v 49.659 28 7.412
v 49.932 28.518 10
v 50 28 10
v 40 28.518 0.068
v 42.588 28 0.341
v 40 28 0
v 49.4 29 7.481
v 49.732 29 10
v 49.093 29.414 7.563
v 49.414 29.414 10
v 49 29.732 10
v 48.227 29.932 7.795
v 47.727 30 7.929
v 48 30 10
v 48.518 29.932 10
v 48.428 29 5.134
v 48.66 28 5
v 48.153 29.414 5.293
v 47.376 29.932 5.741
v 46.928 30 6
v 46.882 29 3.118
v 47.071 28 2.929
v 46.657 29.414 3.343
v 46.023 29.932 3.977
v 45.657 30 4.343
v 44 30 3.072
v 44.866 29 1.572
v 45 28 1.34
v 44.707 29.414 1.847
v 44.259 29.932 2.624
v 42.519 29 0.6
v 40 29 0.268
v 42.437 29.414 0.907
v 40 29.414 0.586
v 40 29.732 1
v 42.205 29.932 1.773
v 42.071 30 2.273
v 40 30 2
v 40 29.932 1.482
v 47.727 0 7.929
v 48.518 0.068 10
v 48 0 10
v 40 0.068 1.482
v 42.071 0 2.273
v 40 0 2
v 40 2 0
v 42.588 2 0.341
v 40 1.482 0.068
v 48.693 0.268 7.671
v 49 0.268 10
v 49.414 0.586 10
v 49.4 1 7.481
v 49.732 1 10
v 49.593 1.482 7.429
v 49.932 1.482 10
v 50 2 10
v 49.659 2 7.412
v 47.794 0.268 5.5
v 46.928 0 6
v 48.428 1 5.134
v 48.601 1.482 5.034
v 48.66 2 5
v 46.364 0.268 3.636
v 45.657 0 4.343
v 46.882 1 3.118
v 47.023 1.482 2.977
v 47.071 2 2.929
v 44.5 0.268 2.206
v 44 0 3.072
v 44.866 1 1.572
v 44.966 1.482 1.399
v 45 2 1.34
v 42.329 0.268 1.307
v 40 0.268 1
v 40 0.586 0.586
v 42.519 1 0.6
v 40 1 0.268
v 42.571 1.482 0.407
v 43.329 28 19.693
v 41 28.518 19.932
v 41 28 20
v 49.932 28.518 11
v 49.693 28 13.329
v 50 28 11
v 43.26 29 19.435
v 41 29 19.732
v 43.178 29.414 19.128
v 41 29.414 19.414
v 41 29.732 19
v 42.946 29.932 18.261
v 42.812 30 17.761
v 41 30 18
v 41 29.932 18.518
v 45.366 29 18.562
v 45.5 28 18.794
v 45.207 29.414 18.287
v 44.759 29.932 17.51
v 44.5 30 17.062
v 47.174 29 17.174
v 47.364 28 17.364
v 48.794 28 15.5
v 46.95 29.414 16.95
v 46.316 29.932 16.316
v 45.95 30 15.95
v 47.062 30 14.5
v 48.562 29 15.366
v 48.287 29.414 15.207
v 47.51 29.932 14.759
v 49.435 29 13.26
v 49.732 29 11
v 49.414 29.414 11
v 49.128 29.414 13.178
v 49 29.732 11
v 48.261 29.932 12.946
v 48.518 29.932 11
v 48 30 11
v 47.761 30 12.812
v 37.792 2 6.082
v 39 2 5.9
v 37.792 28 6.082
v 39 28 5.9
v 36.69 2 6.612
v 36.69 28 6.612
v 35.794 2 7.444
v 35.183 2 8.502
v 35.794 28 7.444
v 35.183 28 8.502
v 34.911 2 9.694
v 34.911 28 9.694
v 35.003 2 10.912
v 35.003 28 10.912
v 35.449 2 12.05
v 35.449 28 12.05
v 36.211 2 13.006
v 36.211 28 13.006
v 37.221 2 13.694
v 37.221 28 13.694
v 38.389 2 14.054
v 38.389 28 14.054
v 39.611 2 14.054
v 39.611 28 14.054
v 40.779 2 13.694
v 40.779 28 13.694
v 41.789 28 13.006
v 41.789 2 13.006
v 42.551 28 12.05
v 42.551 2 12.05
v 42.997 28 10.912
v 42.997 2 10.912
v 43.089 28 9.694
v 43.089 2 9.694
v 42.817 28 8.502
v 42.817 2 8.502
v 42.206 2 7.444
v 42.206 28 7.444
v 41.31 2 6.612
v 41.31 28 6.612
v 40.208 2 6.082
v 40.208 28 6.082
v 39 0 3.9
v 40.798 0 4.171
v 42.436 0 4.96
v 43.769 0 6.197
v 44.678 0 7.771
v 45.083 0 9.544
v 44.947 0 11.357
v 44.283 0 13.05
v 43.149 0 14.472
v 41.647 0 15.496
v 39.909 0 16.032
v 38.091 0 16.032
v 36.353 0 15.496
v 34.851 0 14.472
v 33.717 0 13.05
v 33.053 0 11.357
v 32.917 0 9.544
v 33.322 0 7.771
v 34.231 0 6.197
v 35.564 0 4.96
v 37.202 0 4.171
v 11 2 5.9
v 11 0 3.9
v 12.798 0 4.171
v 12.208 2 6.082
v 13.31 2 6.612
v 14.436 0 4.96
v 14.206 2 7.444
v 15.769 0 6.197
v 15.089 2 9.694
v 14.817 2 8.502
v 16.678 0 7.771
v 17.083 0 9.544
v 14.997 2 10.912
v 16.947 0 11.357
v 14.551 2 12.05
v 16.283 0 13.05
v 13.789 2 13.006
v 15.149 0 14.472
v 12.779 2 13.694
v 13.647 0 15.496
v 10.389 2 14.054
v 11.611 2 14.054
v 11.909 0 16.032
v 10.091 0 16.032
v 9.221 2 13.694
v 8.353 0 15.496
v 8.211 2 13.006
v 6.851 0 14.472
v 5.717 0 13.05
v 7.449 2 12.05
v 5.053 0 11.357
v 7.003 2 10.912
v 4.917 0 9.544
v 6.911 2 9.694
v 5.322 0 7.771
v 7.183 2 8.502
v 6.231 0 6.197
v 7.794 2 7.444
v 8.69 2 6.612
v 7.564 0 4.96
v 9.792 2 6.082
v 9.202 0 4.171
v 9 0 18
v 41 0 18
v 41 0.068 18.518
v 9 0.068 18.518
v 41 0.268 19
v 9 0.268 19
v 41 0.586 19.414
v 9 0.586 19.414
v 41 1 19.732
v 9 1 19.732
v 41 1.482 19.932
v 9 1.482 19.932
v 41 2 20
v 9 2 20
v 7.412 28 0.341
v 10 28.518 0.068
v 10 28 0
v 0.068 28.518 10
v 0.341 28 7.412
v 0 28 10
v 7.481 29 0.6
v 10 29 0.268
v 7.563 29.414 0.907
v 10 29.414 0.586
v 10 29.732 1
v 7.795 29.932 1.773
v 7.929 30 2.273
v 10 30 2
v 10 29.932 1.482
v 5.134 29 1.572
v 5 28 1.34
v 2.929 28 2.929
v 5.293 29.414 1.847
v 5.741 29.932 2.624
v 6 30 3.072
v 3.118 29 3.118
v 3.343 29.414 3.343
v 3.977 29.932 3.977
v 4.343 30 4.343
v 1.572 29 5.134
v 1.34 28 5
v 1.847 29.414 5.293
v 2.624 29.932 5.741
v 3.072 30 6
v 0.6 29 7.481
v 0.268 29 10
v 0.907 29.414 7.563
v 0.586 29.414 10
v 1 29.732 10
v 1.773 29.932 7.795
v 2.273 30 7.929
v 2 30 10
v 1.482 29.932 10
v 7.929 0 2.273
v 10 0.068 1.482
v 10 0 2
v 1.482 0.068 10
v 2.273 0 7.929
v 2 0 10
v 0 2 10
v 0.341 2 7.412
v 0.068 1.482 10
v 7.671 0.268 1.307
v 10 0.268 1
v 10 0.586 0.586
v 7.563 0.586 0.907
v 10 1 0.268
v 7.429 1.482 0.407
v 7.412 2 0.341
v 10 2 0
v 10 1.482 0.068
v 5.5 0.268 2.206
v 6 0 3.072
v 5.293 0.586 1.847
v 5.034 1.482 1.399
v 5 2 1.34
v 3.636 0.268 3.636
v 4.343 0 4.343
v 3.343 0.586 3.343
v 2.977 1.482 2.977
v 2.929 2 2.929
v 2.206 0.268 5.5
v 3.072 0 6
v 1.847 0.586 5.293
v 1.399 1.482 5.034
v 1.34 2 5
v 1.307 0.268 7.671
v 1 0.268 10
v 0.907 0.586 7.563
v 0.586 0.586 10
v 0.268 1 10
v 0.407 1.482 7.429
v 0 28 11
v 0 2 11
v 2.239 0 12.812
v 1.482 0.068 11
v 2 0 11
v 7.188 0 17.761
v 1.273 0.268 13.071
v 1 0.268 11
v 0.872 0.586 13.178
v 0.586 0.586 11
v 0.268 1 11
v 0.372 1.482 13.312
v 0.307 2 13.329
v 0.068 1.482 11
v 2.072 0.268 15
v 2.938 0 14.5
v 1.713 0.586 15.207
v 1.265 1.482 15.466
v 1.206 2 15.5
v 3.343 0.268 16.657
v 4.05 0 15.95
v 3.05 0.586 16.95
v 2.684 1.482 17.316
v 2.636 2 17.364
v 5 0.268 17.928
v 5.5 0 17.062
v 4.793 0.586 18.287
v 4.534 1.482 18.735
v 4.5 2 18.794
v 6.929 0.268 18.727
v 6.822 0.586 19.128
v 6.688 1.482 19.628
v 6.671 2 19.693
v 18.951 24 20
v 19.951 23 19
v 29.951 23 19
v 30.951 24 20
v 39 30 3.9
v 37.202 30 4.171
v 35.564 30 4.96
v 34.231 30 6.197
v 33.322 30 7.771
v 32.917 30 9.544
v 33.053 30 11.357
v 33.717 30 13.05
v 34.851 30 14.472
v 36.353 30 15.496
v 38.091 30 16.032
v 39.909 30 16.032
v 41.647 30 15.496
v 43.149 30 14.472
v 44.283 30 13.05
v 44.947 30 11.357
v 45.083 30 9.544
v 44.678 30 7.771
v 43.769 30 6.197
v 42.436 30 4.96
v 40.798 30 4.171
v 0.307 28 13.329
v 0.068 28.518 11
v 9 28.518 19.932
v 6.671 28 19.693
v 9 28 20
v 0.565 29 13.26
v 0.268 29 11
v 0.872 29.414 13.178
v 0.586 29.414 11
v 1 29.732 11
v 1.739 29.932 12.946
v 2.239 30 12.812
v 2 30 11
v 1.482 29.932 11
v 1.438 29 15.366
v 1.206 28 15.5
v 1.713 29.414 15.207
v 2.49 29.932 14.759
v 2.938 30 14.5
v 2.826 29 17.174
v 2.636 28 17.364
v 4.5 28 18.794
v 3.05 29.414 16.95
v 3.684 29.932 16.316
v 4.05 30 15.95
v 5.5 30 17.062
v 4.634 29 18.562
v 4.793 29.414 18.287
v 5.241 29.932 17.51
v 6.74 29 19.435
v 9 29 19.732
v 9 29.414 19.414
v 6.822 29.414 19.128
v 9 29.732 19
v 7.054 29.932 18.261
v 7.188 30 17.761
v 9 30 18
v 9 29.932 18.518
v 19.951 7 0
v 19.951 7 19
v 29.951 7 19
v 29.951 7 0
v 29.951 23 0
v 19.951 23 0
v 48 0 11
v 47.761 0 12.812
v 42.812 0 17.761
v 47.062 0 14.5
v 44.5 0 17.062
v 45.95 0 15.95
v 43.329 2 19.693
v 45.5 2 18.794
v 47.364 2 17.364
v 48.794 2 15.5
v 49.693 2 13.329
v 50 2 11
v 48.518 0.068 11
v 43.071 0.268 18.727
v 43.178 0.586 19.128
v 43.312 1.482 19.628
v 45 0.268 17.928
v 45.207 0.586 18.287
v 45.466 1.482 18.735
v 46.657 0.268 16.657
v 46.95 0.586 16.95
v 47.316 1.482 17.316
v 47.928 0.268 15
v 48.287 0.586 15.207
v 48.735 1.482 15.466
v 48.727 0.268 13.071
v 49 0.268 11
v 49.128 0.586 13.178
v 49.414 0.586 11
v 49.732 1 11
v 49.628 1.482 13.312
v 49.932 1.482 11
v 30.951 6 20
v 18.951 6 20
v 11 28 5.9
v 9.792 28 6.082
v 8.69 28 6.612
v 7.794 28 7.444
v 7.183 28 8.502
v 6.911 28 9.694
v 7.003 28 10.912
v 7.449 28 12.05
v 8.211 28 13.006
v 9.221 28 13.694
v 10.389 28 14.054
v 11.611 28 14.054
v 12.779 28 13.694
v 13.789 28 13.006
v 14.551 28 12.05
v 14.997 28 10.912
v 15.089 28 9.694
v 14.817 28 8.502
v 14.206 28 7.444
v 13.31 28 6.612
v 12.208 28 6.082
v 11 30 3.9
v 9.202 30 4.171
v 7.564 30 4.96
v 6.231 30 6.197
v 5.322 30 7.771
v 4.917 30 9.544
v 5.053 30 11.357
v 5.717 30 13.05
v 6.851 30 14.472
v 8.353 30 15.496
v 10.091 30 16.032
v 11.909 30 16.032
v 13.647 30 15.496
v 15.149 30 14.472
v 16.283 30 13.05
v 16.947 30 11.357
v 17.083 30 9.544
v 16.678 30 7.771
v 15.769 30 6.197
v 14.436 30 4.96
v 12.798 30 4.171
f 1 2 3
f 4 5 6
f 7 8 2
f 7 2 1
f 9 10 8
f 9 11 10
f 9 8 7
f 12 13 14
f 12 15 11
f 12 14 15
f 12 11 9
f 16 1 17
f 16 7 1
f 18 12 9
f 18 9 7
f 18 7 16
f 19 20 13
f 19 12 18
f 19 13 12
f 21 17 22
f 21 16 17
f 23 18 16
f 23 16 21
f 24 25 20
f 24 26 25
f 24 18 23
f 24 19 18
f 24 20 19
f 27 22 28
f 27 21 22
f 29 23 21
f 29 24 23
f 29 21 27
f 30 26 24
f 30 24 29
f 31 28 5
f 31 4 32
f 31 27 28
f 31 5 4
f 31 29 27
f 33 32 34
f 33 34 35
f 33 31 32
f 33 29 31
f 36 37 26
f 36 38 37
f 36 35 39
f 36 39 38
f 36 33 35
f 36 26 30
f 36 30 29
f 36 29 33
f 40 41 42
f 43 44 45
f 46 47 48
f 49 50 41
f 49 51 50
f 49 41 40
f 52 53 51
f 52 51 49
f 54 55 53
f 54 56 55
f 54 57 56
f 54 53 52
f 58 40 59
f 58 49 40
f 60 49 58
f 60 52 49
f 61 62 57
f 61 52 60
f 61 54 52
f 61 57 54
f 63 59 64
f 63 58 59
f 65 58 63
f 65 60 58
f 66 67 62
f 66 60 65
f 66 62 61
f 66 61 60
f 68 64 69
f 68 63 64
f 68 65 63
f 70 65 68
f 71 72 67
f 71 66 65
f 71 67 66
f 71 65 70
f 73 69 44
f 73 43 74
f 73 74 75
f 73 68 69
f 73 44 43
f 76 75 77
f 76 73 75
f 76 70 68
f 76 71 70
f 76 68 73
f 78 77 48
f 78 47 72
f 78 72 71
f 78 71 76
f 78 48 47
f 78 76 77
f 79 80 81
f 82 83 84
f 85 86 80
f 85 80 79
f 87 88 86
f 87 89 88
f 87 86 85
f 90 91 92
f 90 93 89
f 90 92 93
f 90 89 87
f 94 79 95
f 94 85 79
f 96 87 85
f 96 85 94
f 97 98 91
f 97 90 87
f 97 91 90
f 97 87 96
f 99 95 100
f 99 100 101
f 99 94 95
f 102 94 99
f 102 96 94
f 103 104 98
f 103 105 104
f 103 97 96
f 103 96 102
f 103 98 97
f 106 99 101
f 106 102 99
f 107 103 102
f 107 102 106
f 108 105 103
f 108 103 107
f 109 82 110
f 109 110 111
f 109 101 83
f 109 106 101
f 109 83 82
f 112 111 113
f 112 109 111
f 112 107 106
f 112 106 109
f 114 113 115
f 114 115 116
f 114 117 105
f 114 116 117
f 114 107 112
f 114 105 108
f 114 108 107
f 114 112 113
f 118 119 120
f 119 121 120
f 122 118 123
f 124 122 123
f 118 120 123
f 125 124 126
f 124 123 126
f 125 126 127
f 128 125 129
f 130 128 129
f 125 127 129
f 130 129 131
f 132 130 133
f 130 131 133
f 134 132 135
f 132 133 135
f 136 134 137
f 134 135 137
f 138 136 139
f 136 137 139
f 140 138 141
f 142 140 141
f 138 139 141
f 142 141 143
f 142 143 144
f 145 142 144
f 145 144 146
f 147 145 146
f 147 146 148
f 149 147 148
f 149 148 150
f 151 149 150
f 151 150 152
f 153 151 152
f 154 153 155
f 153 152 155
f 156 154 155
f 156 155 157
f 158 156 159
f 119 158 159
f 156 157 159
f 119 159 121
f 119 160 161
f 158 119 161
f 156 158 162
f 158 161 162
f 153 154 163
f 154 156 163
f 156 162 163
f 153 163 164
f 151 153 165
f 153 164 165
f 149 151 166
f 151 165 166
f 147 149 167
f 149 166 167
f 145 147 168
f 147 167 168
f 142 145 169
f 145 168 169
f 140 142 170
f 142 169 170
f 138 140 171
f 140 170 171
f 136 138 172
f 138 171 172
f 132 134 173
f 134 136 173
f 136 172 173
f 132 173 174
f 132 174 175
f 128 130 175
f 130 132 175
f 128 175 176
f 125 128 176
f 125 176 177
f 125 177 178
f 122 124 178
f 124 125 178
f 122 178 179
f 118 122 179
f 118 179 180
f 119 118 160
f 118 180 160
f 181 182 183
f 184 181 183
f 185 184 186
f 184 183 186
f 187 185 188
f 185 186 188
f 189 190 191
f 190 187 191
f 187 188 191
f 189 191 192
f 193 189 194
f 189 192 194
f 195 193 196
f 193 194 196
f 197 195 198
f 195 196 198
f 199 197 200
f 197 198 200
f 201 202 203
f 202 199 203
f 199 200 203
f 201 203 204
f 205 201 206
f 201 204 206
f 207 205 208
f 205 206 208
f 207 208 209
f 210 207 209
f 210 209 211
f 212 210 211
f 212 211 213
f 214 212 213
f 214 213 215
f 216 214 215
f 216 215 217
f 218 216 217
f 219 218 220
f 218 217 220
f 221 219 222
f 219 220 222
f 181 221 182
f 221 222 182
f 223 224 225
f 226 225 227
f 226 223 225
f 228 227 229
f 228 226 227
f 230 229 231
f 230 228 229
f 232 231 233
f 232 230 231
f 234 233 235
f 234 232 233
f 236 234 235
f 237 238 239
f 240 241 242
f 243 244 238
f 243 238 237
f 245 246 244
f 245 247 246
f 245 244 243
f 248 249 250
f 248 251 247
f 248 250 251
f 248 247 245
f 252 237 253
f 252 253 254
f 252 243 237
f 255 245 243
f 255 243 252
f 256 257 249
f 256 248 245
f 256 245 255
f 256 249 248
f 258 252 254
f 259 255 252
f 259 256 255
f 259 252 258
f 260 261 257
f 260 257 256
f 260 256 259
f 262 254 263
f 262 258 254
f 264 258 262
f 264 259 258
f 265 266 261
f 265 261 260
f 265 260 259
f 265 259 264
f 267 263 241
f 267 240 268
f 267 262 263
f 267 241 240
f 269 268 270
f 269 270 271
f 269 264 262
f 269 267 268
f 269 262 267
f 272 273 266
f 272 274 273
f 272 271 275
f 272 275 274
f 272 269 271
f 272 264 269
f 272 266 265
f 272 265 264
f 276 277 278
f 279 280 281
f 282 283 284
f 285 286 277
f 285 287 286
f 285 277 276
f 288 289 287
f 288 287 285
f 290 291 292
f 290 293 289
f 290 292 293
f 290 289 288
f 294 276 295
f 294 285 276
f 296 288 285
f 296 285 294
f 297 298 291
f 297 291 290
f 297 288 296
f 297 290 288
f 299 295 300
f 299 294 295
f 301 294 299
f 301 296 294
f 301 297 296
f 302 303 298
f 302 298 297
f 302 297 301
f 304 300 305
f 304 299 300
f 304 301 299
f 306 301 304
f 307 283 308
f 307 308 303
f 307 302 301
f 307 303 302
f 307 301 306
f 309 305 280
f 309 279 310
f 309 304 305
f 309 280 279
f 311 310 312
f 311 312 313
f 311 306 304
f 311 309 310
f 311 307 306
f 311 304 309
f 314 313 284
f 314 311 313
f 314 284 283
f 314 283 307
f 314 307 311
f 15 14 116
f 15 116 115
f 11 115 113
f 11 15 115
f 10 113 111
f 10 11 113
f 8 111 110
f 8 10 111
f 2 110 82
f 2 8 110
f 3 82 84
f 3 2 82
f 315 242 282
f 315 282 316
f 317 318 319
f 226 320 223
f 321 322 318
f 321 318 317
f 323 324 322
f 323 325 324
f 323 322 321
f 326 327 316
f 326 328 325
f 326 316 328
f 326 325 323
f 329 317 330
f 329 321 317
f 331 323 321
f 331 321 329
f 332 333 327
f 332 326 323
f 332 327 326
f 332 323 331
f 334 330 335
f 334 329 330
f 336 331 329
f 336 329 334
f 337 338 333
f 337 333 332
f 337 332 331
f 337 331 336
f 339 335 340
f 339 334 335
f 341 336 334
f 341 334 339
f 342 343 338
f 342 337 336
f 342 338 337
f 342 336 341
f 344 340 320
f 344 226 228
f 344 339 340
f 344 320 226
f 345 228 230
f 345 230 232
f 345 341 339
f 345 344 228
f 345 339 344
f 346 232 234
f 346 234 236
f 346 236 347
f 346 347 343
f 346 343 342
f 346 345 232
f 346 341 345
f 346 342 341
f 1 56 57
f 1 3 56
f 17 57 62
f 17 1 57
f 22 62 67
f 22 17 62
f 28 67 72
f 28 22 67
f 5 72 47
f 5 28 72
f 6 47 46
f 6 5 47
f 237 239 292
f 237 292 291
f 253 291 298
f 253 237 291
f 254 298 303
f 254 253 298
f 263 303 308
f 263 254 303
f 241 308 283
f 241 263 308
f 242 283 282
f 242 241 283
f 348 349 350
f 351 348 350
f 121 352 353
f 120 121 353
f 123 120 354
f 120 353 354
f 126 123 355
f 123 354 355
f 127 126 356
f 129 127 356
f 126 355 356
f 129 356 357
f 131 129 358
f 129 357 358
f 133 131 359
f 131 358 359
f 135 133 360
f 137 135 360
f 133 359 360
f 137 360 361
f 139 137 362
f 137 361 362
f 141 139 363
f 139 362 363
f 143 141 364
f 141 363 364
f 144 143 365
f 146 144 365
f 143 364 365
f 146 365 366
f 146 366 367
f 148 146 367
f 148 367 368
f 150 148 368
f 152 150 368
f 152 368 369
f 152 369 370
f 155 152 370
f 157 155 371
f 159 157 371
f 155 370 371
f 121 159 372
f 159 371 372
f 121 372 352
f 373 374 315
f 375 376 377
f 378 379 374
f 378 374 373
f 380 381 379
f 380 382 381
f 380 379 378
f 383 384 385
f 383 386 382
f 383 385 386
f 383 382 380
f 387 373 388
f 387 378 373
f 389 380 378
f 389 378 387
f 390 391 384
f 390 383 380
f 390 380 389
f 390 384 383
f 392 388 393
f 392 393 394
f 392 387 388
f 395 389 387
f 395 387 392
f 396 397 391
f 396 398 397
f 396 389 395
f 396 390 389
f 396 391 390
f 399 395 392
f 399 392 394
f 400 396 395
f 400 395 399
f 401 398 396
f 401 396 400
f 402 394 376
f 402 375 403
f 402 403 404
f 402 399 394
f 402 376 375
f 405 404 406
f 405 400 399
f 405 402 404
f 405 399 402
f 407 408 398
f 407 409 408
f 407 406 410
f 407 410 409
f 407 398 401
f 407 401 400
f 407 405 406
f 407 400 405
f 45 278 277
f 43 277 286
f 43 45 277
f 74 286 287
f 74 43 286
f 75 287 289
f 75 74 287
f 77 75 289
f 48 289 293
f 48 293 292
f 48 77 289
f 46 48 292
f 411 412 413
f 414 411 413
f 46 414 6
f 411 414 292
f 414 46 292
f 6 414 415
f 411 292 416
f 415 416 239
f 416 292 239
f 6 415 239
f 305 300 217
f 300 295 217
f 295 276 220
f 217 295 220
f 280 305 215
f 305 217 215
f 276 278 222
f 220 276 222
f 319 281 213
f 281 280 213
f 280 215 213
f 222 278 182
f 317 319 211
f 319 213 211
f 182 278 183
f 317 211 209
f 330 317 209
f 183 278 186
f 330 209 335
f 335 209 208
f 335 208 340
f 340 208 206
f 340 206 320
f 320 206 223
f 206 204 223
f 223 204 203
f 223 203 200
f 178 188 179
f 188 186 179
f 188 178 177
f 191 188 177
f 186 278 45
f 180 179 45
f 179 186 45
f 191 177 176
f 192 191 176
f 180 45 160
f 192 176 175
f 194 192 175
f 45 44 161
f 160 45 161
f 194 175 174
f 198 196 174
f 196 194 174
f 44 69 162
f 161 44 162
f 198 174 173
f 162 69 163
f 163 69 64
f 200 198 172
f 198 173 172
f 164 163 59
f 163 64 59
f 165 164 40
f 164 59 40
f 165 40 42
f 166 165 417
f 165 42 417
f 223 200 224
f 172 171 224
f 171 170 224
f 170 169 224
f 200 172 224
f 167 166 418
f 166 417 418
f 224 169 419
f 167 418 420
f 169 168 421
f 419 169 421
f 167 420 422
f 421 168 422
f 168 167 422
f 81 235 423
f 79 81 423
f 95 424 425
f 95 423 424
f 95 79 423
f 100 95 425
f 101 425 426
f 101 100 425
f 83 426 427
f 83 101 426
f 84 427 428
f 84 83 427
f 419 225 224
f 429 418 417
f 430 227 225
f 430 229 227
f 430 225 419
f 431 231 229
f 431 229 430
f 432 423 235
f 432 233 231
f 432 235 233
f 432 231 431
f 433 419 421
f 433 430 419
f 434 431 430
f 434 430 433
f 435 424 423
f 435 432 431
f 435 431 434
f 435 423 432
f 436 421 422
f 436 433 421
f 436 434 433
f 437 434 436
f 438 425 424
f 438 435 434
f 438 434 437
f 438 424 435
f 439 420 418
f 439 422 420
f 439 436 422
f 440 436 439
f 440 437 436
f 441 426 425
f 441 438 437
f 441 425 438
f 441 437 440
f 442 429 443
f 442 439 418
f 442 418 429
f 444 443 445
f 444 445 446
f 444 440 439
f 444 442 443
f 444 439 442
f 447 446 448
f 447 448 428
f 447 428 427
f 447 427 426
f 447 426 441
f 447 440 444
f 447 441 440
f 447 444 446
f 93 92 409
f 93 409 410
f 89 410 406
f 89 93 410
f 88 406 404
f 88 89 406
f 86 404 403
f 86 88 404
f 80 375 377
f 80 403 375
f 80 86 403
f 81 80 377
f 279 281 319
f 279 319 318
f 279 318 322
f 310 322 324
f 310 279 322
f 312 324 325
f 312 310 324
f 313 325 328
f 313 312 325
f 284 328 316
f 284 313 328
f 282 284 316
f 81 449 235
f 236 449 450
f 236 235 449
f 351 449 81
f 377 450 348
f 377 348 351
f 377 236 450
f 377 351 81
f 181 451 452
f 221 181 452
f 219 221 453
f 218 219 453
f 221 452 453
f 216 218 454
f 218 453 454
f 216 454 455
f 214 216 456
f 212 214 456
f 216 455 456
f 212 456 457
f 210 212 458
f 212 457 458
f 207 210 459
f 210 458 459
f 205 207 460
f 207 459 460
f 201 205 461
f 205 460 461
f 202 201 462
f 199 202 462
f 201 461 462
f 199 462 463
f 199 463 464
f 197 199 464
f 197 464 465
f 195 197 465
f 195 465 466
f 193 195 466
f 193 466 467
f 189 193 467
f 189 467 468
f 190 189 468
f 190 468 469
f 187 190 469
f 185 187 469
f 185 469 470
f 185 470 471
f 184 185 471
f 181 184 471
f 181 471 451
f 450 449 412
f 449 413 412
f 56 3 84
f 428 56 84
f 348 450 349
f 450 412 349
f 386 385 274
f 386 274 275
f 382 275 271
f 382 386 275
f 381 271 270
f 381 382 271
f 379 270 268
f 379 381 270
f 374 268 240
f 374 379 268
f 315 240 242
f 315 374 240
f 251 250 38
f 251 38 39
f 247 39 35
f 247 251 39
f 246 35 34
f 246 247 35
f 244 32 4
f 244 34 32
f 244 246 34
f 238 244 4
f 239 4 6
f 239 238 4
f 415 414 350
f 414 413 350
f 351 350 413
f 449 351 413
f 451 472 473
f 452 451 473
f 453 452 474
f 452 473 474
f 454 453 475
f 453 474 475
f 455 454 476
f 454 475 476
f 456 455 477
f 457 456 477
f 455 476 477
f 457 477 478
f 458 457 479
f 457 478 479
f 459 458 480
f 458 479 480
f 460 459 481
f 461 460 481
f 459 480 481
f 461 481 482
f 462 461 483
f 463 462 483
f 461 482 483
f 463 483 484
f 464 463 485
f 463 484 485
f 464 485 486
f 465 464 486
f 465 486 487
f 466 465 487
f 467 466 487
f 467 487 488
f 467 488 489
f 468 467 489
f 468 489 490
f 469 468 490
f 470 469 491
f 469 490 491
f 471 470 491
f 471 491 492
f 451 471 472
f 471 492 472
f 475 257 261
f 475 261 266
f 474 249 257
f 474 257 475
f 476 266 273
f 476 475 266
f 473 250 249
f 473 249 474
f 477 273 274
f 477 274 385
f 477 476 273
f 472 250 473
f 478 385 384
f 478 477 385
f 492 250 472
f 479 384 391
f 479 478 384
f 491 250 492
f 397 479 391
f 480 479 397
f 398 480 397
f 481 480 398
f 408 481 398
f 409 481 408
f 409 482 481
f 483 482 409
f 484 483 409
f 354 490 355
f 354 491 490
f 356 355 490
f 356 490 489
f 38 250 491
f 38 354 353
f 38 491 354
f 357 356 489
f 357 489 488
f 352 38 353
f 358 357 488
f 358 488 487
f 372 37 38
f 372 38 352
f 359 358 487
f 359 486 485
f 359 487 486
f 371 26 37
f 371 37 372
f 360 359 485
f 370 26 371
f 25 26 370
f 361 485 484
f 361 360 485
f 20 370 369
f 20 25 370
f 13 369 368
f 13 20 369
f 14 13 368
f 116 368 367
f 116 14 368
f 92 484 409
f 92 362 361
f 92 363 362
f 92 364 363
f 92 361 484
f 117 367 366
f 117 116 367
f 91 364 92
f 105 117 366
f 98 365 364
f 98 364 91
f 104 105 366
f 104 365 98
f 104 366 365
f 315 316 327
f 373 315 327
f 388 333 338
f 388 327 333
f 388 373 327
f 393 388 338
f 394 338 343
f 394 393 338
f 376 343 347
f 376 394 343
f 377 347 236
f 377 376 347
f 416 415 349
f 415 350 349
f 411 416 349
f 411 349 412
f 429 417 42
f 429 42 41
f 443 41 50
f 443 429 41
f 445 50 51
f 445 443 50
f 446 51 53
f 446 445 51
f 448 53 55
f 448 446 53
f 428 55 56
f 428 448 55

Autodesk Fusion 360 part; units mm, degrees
box "Grundkörper Quader1" add length 30 width 50 height 20 placed x (0, 1, 0) y (-1, 0, 0) z (0, 0, 1) at (50, 0, 0)
sketch "Skizze2" plane through (0, 0, 0) normal (0, -1, 0) x (1, 0, 0)
  line L0 (0, 20) -> (0, 0)
  line L1 (0, 0) -> (50, 0)
  line L2 (50, 0) -> (50, 20)
  line L3 (50, 20) -> (0, 20)
sketch "Skizze3" plane through (0, 0, 0) normal (0, -1, 0) x (1, 0, 0)
  circle A0 centre (11, 10) radius 4.1
  circle A1 centre (39, 10) radius 4.1
  line L0 (0, 20) -> (0, 0)
  line L1 (50, 0) -> (50, 20)
  line L2 (50, 20) -> (0, 20)
  line L3 (50, 0) -> (0, 0)
  dimension "d6" = 8.2
  dimension "d7" = 8.2
  dimension "d8" = 28
  dimension "d10" = 11
  dimension "d11" = 10
  dimension "d23" = 10
hole "Bohrung1" at (11, 0, 10) direction (0, 1, 0) diameter 8.2 depth 30 tip angle 118
sketch "Skizze4" plane through (0, 0, 0) normal (0, -1, 0) x (1, 0, 0)
hole "Bohrung2" at (39, 0, 10) direction (0, 1, 0) diameter 8.2 depth 30 tip angle 118
fillet "Abrundung1" radius 9 2 edges at (0, 15, 20) (50, 15, 20)
fillet "Abrundung2" radius 10 2 edges at (50, 15, 0) (0, 15, 0)
fillet "Abrundung3" radius 2 8 edges at (50, 0, 10.5) (47.0711, 0, 2.9289) (25, 0, 0) (2.9289, 0, 2.9289) (0, 0, 10.5) (2.636, 0, 17.364) (25, 0, 20) (47.364, 0, 17.364)
fillet "Abrundung4" radius 2 8 edges at (0, 30, 10.5) (2.9289, 30, 2.9289) (25, 30, 0) (47.0711, 30, 2.9289) (50, 30, 10.5) (47.364, 30, 17.364) (25, 30, 20) (2.636, 30, 17.364)
chamfer "Fase1" distance 2 angle 45 2 edges at (37.5174, 30, 13.8225) (9.5174, 30, 13.8225)
chamfer "Fase2" distance 2 angle 45 2 edges at (12.4826, 0, 13.8225) (40.4826, 0, 13.8225)
sketch "Skizze5" plane through (0, 0, 20) normal (0, 0, 1) x (-1, 0, 0)
  line L0 (-41, -28) -> (-9, -28)
  line L1 (-9, -28) -> (-9, -2)
  line L2 (-9, -2) -> (-41, -2)
  line L3 (-41, -2) -> (-41, -28)
  line L4 (-29.951, -7) -> (-29.951, -23)
  line L5 (-29.951, -23) -> (-19.951, -23)
  line L6 (-19.951, -23) -> (-19.951, -7)
  line L7 (-19.951, -7) -> (-29.951, -7)
extrude "Extrusion1" cut sketch "Skizze5" against normal blind 32 contours L4 L5 L6 L7
chamfer "Fase3" distance 1 angle 45 4 edges at (19.951, 15, 20) (29.951, 15, 20) (24.951, 7, 20) (24.951, 23, 20)
